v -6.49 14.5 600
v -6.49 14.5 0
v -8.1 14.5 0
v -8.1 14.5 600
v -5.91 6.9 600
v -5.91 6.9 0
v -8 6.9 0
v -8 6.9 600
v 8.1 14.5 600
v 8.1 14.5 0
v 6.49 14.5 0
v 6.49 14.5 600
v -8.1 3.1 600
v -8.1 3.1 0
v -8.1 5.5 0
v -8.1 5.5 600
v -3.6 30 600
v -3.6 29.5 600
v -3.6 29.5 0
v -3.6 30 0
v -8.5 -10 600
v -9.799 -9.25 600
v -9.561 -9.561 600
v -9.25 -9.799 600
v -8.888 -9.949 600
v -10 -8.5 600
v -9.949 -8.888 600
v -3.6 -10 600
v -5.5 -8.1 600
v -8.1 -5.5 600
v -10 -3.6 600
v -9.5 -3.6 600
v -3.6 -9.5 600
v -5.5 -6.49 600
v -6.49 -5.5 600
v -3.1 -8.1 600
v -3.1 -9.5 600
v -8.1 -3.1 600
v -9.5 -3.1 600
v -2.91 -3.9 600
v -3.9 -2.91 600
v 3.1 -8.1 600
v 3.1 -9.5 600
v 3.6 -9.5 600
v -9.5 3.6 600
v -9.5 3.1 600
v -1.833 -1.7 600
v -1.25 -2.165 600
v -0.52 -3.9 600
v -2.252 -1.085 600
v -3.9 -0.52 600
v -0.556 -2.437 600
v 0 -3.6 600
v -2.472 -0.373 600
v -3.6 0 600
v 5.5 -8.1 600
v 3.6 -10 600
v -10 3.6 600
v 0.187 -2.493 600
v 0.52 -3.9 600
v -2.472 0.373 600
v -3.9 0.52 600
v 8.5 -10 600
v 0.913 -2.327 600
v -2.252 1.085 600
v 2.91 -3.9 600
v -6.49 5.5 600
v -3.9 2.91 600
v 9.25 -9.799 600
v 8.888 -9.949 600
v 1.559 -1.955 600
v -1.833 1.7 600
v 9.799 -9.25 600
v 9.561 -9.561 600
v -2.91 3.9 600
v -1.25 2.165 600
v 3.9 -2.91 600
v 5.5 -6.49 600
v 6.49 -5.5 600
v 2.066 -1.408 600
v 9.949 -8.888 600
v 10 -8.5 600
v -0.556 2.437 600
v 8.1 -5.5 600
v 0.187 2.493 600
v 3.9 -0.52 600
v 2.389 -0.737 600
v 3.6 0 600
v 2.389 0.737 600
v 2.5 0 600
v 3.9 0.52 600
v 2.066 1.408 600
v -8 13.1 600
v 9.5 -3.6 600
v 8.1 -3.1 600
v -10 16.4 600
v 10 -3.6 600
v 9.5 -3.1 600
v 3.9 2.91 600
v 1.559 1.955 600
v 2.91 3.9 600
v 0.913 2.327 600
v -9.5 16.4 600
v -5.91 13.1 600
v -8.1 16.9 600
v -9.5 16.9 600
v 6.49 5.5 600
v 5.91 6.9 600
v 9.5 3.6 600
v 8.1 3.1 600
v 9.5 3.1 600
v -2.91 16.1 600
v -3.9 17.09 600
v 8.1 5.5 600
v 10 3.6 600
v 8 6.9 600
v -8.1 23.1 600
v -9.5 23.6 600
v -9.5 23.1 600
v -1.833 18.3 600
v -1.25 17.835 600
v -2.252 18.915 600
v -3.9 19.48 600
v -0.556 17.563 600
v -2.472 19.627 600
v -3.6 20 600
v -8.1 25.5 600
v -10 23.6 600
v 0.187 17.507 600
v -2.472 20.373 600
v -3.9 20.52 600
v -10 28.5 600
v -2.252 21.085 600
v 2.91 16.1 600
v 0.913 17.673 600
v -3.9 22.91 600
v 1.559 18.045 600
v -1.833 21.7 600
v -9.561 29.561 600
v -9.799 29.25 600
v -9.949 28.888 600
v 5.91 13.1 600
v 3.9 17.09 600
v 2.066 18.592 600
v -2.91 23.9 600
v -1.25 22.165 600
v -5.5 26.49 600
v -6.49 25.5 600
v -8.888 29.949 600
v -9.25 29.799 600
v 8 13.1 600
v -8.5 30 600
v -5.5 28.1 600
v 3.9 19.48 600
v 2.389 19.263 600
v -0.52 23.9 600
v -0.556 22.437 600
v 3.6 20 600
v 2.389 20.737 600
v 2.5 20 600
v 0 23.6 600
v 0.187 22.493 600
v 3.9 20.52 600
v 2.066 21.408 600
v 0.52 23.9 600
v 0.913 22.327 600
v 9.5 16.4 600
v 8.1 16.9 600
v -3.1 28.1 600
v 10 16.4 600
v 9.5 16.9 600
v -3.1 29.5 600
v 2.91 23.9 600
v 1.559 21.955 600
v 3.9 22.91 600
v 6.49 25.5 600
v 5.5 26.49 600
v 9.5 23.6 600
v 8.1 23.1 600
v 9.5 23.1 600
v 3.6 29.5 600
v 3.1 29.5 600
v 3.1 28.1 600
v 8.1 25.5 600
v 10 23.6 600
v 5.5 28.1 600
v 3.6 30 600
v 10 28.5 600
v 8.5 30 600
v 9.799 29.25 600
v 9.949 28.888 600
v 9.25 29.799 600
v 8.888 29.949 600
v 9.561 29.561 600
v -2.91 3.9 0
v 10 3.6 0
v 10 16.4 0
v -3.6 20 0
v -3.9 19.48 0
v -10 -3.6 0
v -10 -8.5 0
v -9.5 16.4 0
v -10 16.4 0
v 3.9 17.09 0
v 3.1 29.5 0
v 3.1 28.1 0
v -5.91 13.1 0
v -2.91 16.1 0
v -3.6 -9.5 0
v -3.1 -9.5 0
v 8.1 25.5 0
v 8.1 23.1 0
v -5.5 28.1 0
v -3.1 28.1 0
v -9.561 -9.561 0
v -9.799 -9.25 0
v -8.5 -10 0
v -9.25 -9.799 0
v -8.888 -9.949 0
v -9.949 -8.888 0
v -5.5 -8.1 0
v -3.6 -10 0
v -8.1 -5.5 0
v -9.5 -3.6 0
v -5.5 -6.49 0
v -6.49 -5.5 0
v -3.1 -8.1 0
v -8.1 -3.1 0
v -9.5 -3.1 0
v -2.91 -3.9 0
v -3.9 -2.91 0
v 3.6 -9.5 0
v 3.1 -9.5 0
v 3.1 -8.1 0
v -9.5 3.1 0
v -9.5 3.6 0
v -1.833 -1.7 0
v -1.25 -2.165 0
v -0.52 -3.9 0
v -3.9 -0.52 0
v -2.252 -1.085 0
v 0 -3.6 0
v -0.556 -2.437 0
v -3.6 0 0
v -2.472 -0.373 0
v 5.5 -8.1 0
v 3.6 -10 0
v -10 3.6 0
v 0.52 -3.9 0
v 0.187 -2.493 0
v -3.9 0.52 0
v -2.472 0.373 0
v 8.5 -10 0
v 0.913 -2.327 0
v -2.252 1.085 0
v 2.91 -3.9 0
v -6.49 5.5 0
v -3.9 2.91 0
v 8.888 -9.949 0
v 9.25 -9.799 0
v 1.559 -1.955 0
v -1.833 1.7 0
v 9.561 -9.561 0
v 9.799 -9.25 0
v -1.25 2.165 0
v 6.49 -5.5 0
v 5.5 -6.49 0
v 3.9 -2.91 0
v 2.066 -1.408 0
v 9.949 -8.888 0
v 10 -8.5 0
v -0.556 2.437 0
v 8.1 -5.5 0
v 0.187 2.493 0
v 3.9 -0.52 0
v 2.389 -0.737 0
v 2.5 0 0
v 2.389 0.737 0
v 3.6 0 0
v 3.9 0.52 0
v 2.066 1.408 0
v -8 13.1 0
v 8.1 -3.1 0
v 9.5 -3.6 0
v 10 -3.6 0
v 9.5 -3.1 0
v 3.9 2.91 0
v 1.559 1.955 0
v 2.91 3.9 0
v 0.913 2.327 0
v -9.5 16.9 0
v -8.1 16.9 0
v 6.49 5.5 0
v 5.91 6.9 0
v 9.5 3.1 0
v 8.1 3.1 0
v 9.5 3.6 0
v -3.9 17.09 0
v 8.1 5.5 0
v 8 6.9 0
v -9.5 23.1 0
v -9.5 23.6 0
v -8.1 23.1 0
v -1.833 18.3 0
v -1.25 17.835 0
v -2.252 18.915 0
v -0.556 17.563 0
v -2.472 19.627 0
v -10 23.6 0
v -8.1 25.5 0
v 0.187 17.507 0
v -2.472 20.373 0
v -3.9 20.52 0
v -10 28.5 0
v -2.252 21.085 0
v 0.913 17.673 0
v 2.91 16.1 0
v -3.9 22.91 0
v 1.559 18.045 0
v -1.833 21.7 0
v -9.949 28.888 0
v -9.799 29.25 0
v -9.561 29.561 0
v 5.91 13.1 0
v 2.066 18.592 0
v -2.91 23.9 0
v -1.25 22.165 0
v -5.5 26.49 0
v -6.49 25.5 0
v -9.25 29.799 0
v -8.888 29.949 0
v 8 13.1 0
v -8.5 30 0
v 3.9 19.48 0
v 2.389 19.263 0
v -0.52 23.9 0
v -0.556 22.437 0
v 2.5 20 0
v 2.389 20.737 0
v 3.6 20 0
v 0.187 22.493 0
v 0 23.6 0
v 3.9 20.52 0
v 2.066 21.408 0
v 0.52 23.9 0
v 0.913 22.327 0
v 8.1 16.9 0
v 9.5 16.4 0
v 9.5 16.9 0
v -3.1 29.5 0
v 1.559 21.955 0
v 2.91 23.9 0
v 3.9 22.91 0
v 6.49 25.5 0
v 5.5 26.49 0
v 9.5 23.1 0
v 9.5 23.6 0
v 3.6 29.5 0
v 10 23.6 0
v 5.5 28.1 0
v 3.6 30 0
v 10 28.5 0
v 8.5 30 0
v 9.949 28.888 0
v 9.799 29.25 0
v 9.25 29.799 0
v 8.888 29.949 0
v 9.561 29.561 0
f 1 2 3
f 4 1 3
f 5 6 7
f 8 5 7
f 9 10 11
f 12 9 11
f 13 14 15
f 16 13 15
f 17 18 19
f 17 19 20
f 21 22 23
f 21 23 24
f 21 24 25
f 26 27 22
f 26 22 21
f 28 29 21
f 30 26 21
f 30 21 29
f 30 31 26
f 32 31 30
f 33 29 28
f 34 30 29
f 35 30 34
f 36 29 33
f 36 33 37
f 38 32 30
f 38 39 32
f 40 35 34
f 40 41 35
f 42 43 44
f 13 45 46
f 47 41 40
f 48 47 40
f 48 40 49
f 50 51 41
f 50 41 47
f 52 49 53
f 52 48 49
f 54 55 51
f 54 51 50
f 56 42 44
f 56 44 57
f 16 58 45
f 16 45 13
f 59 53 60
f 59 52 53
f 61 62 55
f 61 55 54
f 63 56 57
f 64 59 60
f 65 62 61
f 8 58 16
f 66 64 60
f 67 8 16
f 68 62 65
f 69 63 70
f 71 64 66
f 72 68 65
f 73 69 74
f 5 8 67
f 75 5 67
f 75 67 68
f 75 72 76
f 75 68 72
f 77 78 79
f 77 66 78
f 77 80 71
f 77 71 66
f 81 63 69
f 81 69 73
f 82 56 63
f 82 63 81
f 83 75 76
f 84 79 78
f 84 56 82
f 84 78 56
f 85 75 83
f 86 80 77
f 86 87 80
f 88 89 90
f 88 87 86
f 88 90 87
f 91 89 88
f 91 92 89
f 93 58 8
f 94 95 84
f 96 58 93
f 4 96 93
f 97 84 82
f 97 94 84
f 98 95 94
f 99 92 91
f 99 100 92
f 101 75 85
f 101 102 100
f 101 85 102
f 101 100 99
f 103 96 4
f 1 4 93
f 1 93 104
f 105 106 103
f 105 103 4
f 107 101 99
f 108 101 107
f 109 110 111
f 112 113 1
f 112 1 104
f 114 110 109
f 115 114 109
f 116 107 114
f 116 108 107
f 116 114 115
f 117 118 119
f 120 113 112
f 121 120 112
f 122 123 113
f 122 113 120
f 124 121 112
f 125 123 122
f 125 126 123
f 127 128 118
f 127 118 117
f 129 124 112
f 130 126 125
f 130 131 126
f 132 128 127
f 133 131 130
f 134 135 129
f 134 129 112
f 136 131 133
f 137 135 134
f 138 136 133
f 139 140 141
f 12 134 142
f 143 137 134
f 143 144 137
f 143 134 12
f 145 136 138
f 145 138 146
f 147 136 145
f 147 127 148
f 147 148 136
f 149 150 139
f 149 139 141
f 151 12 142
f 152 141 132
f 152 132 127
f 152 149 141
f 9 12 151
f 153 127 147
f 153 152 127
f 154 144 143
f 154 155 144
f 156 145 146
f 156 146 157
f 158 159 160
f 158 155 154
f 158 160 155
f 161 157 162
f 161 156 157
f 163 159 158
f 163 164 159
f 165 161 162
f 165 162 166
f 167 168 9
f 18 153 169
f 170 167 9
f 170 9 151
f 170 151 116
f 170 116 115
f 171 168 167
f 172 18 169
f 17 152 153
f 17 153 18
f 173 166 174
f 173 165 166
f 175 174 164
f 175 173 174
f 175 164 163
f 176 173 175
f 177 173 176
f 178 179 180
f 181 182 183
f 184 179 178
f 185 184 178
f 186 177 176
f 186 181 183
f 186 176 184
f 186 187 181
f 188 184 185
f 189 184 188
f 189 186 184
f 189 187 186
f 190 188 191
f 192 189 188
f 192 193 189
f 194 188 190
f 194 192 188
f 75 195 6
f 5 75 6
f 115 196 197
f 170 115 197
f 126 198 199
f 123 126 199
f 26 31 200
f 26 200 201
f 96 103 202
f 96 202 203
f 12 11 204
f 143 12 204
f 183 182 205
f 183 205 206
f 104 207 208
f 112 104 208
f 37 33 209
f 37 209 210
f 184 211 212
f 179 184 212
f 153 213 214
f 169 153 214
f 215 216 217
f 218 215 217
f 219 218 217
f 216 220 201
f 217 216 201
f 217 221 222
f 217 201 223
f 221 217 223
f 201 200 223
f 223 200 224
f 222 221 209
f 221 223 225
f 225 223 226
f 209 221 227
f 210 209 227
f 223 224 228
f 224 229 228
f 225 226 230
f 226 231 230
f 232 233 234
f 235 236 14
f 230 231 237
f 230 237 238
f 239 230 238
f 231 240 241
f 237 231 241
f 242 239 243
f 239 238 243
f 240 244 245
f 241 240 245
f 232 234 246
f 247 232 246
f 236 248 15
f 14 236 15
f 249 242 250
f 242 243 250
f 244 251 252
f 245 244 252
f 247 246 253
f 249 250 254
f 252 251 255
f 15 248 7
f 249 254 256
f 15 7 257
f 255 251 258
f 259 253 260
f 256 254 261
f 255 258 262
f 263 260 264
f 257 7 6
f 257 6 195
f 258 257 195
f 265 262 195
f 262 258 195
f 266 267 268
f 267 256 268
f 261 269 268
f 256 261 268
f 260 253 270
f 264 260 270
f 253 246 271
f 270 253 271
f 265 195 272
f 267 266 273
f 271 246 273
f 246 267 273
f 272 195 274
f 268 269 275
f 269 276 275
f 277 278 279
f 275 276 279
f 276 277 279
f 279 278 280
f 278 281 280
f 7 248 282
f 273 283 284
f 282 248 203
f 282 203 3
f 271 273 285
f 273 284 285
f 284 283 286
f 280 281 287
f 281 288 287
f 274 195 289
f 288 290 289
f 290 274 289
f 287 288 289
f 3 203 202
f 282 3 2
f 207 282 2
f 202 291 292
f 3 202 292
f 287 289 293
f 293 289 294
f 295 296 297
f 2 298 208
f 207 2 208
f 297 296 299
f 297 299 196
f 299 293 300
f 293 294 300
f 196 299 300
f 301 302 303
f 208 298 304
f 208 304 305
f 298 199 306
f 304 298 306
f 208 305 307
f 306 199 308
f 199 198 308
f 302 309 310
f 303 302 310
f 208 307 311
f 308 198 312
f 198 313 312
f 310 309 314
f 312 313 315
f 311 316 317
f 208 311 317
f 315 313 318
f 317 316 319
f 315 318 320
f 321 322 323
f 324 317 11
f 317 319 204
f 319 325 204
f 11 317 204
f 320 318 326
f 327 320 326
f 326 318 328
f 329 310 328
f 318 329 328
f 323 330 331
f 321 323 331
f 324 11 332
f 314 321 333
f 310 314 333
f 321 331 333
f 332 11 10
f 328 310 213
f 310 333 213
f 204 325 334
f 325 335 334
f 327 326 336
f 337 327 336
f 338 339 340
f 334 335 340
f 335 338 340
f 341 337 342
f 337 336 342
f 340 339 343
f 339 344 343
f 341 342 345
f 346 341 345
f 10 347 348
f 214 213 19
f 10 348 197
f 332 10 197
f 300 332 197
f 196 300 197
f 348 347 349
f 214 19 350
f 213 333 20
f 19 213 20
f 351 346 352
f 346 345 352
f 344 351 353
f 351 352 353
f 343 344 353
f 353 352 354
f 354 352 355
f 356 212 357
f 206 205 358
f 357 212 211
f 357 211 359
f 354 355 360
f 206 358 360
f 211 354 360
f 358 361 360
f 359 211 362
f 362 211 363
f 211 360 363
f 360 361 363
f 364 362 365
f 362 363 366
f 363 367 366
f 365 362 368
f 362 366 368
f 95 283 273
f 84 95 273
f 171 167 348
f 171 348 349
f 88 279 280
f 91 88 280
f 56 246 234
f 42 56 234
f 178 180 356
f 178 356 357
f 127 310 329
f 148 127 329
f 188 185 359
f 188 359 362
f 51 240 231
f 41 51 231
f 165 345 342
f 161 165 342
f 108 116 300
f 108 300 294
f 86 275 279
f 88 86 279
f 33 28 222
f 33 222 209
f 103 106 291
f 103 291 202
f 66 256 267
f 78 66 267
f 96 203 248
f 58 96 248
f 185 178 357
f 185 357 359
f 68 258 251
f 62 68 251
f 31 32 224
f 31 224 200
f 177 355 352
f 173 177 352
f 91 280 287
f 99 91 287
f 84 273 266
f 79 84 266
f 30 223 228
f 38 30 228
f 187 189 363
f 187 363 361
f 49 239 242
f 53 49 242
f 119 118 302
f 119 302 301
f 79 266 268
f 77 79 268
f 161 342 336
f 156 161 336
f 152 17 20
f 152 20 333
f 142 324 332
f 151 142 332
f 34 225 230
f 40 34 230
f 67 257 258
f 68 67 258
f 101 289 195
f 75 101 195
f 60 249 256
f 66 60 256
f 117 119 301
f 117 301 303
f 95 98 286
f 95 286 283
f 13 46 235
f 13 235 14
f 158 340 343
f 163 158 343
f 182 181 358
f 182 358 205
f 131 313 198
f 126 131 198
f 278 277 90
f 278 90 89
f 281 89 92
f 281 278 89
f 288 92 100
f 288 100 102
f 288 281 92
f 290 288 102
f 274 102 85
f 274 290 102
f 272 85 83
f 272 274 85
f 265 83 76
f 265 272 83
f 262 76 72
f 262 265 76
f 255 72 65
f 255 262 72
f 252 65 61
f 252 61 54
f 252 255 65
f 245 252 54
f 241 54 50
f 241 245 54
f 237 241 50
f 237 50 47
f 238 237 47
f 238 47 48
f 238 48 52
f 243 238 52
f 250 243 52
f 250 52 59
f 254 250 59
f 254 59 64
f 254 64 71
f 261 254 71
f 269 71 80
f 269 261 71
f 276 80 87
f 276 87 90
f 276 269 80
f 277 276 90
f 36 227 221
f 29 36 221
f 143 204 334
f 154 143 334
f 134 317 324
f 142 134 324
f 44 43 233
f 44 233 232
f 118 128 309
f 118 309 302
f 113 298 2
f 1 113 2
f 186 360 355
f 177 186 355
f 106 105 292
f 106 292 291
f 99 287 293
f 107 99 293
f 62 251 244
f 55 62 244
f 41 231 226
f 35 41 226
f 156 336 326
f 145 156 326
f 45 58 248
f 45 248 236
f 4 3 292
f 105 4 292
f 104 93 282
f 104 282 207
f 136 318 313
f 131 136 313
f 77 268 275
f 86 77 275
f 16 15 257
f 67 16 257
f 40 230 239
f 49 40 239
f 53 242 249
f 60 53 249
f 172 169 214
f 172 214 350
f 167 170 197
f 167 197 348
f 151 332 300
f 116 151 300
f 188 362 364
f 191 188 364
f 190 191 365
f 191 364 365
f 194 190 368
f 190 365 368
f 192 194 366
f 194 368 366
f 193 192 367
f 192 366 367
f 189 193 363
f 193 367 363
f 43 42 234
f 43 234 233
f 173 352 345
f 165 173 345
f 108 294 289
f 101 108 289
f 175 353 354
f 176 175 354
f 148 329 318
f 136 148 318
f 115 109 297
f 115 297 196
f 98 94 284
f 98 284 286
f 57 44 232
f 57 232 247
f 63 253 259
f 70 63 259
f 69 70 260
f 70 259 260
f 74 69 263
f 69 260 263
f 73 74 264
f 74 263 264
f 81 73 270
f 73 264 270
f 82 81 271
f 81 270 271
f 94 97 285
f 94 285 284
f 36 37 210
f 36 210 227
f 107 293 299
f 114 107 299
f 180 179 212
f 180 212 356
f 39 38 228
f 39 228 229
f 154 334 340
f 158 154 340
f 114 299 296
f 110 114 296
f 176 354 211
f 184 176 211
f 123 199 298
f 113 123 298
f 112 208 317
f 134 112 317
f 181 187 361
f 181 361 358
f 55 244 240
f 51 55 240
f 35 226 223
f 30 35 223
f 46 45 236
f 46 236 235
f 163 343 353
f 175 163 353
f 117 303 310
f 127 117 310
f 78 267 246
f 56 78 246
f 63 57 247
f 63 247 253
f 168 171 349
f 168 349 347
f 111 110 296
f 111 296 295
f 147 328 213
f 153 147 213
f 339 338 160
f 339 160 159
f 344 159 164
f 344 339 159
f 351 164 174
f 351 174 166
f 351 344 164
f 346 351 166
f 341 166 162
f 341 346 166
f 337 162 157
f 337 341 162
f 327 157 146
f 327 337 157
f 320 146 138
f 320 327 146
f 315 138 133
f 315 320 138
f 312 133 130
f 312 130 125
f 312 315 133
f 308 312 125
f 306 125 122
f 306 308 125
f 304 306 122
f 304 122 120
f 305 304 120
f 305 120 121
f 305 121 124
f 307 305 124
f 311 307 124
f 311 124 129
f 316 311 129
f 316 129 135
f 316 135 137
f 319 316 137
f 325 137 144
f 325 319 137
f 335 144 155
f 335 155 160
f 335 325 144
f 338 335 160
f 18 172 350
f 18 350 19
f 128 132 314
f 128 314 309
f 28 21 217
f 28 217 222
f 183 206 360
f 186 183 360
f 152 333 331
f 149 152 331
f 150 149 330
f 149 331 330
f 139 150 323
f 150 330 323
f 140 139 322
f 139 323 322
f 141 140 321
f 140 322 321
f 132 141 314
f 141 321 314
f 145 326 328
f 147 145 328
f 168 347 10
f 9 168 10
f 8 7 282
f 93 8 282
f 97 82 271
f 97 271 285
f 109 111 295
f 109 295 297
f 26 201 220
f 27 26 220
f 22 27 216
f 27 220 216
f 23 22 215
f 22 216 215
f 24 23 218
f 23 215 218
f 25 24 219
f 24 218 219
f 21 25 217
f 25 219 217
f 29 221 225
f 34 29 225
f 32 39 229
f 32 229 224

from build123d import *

# Parameters (mm, degrees)
SKETCH_30_R     = 2.5
EXTRUDE_3_DEPTH = 600


with BuildPart() as part:
    # 草图30 → 凸台-拉伸3 (new body)
    with BuildSketch(Plane.XY):
        with BuildLine():
            Line((-8.1, 14.5), (-8.1, 16.9))
            Line((-8.1, 16.9), (-9.5, 16.9))
            Line((-9.5, 16.9), (-9.5, 16.4))
            Line((-9.5, 16.4), (-10, 16.4))
            Line((-10, 16.4), (-10, 3.6))
            Line((-10, 3.6), (-9.5, 3.6))
            Line((-9.5, 3.6), (-9.5, 3.1))
            Line((-9.5, 3.1), (-8.1, 3.1))
            Line((-8.1, 3.1), (-8.1, 5.5))
            Line((-8.1, 5.5), (-6.489949494, 5.5))
            Line((-6.489949494, 5.5), (-3.9, 2.910050506))
            Line((-3.9, 2.910050506), (-3.9, 0.519615242))
            Line((-3.9, 0.519615242), (-3.6, 0))
            Line((-3.6, 0), (-3.9, -0.519615242))
            Line((-3.9, -0.519615242), (-3.9, -2.910050506))
            Line((-3.9, -2.910050506), (-6.489949494, -5.5))
            Line((-6.489949494, -5.5), (-8.1, -5.5))
            Line((-8.1, -5.5), (-8.1, -3.1))
            Line((-8.1, -3.1), (-9.5, -3.1))
            Line((-9.5, -3.1), (-9.5, -3.6))
            Line((-9.5, -3.6), (-10, -3.6))
            Line((-10, -3.6), (-10, -8.5))
            ThreePointArc((-10, -8.5), (-9.560660172, -9.560660172), (-8.5, -10))
            Line((-8.5, -10), (-3.6, -10))
            Line((-3.6, -10), (-3.6, -9.5))
            Line((-3.6, -9.5), (-3.1, -9.5))
            Line((-3.1, -9.5), (-3.1, -8.1))
            Line((-3.1, -8.1), (-5.5, -8.1))
            Line((-5.5, -8.1), (-5.5, -6.489949494))
            Line((-5.5, -6.489949494), (-2.910050506, -3.9))
            Line((-2.910050506, -3.9), (-0.519615242, -3.9))
            Line((-0.519615242, -3.9), (0, -3.6))
            Line((0, -3.6), (0.519615242, -3.9))
            Line((0.519615242, -3.9), (2.910050506, -3.9))
            Line((2.910050506, -3.9), (5.5, -6.489949494))
            Line((5.5, -6.489949494), (5.5, -8.1))
            Line((5.5, -8.1), (3.1, -8.1))
            Line((3.1, -8.1), (3.1, -9.5))
            Line((3.1, -9.5), (3.6, -9.5))
            Line((3.6, -9.5), (3.6, -10))
            Line((3.6, -10), (8.5, -10))
            ThreePointArc((8.5, -10), (9.560660172, -9.560660172), (10, -8.5))
            Line((10, -8.5), (10, -3.6))
            Line((10, -3.6), (9.5, -3.6))
            Line((9.5, -3.6), (9.5, -3.1))
            Line((9.5, -3.1), (8.1, -3.1))
            Line((8.1, -3.1), (8.1, -5.5))
            Line((8.1, -5.5), (6.489949494, -5.5))
            Line((6.489949494, -5.5), (3.9, -2.910050506))
            Line((3.9, -2.910050506), (3.9, -0.519615242))
            Line((3.9, -0.519615242), (3.6, 0))
            Line((3.6, 0), (3.9, 0.519615242))
            Line((3.9, 0.519615242), (3.9, 2.910050506))
            Line((3.9, 2.910050506), (6.489949494, 5.5))
            Line((6.489949494, 5.5), (8.1, 5.5))
            Line((8.1, 5.5), (8.1, 3.1))
            Line((8.1, 3.1), (9.5, 3.1))
            Line((9.5, 3.1), (9.5, 3.6))
            Line((9.5, 3.6), (10, 3.6))
            Line((10, 3.6), (10, 16.4))
            Line((10, 16.4), (9.5, 16.4))
            Line((9.5, 16.4), (9.5, 16.9))
            Line((9.5, 16.9), (8.1, 16.9))
            Line((8.1, 16.9), (8.1, 14.5))
            Line((8.1, 14.5), (6.489949494, 14.5))
            Line((6.489949494, 14.5), (3.9, 17.089949494))
            Line((3.9, 17.089949494), (3.9, 19.480384758))
            Line((3.9, 19.480384758), (3.6, 20))
            Line((3.6, 20), (3.9, 20.519615242))
            Line((3.9, 20.519615242), (3.9, 22.910050506))
            Line((3.9, 22.910050506), (6.489949494, 25.5))
            Line((6.489949494, 25.5), (8.1, 25.5))
            Line((8.1, 25.5), (8.1, 23.1))
            Line((8.1, 23.1), (9.5, 23.1))
            Line((9.5, 23.1), (9.5, 23.6))
            Line((9.5, 23.6), (10, 23.6))
            Line((10, 23.6), (10, 28.5))
            ThreePointArc((10, 28.5), (9.560660172, 29.560660172), (8.5, 30))
            Line((8.5, 30), (3.6, 30))
            Line((3.6, 30), (3.6, 29.5))
            Line((3.6, 29.5), (3.1, 29.5))
            Line((3.1, 29.5), (3.1, 28.1))
            Line((3.1, 28.1), (5.5, 28.1))
            Line((5.5, 28.1), (5.5, 26.489949494))
            Line((5.5, 26.489949494), (2.910050506, 23.9))
            Line((2.910050506, 23.9), (0.519615242, 23.9))
            Line((0.519615242, 23.9), (0, 23.6))
            Line((0, 23.6), (-0.519615242, 23.9))
            Line((-0.519615242, 23.9), (-2.910050506, 23.9))
            Line((-2.910050506, 23.9), (-5.5, 26.489949494))
            Line((-5.5, 26.489949494), (-5.5, 28.1))
            Line((-5.5, 28.1), (-3.1, 28.1))
            Line((-3.1, 28.1), (-3.1, 29.5))
            Line((-3.1, 29.5), (-3.6, 29.5))
            Line((-3.6, 29.5), (-3.6, 30))
            Line((-3.6, 30), (-8.5, 30))
            ThreePointArc((-8.5, 30), (-9.560660172, 29.560660172), (-10, 28.5))
            Line((-10, 28.5), (-10, 23.6))
            Line((-10, 23.6), (-9.5, 23.6))
            Line((-9.5, 23.6), (-9.5, 23.1))
            Line((-9.5, 23.1), (-8.1, 23.1))
            Line((-8.1, 23.1), (-8.1, 25.5))
            Line((-8.1, 25.5), (-6.489949494, 25.5))
            Line((-6.489949494, 25.5), (-3.9, 22.910050506))
            Line((-3.9, 22.910050506), (-3.9, 20.519615242))
            Line((-3.9, 20.519615242), (-3.6, 20))
            Line((-3.6, 20), (-3.9, 19.480384758))
            Line((-3.9, 19.480384758), (-3.9, 17.089949494))
            Line((-3.9, 17.089949494), (-6.489949494, 14.5))
            Line((-6.489949494, 14.5), (-8.1, 14.5))
        make_face()
        with Locations((0, 20)):
            Circle(SKETCH_30_R, mode=Mode.SUBTRACT)
        Circle(SKETCH_30_R, mode=Mode.SUBTRACT)
        Polygon((5.910050506, 6.9), (2.910050506, 3.9), (-2.910050506, 3.9), (-5.910050506, 6.9), (-8, 6.9), (-8, 13.1), (-5.910050506, 13.1), (-2.910050506, 16.1), (2.910050506, 16.1), (5.910050506, 13.1), (8, 13.1), (8, 6.9), align=None, mode=Mode.SUBTRACT)
    extrude(amount=EXTRUDE_3_DEPTH)


solid = part.part
